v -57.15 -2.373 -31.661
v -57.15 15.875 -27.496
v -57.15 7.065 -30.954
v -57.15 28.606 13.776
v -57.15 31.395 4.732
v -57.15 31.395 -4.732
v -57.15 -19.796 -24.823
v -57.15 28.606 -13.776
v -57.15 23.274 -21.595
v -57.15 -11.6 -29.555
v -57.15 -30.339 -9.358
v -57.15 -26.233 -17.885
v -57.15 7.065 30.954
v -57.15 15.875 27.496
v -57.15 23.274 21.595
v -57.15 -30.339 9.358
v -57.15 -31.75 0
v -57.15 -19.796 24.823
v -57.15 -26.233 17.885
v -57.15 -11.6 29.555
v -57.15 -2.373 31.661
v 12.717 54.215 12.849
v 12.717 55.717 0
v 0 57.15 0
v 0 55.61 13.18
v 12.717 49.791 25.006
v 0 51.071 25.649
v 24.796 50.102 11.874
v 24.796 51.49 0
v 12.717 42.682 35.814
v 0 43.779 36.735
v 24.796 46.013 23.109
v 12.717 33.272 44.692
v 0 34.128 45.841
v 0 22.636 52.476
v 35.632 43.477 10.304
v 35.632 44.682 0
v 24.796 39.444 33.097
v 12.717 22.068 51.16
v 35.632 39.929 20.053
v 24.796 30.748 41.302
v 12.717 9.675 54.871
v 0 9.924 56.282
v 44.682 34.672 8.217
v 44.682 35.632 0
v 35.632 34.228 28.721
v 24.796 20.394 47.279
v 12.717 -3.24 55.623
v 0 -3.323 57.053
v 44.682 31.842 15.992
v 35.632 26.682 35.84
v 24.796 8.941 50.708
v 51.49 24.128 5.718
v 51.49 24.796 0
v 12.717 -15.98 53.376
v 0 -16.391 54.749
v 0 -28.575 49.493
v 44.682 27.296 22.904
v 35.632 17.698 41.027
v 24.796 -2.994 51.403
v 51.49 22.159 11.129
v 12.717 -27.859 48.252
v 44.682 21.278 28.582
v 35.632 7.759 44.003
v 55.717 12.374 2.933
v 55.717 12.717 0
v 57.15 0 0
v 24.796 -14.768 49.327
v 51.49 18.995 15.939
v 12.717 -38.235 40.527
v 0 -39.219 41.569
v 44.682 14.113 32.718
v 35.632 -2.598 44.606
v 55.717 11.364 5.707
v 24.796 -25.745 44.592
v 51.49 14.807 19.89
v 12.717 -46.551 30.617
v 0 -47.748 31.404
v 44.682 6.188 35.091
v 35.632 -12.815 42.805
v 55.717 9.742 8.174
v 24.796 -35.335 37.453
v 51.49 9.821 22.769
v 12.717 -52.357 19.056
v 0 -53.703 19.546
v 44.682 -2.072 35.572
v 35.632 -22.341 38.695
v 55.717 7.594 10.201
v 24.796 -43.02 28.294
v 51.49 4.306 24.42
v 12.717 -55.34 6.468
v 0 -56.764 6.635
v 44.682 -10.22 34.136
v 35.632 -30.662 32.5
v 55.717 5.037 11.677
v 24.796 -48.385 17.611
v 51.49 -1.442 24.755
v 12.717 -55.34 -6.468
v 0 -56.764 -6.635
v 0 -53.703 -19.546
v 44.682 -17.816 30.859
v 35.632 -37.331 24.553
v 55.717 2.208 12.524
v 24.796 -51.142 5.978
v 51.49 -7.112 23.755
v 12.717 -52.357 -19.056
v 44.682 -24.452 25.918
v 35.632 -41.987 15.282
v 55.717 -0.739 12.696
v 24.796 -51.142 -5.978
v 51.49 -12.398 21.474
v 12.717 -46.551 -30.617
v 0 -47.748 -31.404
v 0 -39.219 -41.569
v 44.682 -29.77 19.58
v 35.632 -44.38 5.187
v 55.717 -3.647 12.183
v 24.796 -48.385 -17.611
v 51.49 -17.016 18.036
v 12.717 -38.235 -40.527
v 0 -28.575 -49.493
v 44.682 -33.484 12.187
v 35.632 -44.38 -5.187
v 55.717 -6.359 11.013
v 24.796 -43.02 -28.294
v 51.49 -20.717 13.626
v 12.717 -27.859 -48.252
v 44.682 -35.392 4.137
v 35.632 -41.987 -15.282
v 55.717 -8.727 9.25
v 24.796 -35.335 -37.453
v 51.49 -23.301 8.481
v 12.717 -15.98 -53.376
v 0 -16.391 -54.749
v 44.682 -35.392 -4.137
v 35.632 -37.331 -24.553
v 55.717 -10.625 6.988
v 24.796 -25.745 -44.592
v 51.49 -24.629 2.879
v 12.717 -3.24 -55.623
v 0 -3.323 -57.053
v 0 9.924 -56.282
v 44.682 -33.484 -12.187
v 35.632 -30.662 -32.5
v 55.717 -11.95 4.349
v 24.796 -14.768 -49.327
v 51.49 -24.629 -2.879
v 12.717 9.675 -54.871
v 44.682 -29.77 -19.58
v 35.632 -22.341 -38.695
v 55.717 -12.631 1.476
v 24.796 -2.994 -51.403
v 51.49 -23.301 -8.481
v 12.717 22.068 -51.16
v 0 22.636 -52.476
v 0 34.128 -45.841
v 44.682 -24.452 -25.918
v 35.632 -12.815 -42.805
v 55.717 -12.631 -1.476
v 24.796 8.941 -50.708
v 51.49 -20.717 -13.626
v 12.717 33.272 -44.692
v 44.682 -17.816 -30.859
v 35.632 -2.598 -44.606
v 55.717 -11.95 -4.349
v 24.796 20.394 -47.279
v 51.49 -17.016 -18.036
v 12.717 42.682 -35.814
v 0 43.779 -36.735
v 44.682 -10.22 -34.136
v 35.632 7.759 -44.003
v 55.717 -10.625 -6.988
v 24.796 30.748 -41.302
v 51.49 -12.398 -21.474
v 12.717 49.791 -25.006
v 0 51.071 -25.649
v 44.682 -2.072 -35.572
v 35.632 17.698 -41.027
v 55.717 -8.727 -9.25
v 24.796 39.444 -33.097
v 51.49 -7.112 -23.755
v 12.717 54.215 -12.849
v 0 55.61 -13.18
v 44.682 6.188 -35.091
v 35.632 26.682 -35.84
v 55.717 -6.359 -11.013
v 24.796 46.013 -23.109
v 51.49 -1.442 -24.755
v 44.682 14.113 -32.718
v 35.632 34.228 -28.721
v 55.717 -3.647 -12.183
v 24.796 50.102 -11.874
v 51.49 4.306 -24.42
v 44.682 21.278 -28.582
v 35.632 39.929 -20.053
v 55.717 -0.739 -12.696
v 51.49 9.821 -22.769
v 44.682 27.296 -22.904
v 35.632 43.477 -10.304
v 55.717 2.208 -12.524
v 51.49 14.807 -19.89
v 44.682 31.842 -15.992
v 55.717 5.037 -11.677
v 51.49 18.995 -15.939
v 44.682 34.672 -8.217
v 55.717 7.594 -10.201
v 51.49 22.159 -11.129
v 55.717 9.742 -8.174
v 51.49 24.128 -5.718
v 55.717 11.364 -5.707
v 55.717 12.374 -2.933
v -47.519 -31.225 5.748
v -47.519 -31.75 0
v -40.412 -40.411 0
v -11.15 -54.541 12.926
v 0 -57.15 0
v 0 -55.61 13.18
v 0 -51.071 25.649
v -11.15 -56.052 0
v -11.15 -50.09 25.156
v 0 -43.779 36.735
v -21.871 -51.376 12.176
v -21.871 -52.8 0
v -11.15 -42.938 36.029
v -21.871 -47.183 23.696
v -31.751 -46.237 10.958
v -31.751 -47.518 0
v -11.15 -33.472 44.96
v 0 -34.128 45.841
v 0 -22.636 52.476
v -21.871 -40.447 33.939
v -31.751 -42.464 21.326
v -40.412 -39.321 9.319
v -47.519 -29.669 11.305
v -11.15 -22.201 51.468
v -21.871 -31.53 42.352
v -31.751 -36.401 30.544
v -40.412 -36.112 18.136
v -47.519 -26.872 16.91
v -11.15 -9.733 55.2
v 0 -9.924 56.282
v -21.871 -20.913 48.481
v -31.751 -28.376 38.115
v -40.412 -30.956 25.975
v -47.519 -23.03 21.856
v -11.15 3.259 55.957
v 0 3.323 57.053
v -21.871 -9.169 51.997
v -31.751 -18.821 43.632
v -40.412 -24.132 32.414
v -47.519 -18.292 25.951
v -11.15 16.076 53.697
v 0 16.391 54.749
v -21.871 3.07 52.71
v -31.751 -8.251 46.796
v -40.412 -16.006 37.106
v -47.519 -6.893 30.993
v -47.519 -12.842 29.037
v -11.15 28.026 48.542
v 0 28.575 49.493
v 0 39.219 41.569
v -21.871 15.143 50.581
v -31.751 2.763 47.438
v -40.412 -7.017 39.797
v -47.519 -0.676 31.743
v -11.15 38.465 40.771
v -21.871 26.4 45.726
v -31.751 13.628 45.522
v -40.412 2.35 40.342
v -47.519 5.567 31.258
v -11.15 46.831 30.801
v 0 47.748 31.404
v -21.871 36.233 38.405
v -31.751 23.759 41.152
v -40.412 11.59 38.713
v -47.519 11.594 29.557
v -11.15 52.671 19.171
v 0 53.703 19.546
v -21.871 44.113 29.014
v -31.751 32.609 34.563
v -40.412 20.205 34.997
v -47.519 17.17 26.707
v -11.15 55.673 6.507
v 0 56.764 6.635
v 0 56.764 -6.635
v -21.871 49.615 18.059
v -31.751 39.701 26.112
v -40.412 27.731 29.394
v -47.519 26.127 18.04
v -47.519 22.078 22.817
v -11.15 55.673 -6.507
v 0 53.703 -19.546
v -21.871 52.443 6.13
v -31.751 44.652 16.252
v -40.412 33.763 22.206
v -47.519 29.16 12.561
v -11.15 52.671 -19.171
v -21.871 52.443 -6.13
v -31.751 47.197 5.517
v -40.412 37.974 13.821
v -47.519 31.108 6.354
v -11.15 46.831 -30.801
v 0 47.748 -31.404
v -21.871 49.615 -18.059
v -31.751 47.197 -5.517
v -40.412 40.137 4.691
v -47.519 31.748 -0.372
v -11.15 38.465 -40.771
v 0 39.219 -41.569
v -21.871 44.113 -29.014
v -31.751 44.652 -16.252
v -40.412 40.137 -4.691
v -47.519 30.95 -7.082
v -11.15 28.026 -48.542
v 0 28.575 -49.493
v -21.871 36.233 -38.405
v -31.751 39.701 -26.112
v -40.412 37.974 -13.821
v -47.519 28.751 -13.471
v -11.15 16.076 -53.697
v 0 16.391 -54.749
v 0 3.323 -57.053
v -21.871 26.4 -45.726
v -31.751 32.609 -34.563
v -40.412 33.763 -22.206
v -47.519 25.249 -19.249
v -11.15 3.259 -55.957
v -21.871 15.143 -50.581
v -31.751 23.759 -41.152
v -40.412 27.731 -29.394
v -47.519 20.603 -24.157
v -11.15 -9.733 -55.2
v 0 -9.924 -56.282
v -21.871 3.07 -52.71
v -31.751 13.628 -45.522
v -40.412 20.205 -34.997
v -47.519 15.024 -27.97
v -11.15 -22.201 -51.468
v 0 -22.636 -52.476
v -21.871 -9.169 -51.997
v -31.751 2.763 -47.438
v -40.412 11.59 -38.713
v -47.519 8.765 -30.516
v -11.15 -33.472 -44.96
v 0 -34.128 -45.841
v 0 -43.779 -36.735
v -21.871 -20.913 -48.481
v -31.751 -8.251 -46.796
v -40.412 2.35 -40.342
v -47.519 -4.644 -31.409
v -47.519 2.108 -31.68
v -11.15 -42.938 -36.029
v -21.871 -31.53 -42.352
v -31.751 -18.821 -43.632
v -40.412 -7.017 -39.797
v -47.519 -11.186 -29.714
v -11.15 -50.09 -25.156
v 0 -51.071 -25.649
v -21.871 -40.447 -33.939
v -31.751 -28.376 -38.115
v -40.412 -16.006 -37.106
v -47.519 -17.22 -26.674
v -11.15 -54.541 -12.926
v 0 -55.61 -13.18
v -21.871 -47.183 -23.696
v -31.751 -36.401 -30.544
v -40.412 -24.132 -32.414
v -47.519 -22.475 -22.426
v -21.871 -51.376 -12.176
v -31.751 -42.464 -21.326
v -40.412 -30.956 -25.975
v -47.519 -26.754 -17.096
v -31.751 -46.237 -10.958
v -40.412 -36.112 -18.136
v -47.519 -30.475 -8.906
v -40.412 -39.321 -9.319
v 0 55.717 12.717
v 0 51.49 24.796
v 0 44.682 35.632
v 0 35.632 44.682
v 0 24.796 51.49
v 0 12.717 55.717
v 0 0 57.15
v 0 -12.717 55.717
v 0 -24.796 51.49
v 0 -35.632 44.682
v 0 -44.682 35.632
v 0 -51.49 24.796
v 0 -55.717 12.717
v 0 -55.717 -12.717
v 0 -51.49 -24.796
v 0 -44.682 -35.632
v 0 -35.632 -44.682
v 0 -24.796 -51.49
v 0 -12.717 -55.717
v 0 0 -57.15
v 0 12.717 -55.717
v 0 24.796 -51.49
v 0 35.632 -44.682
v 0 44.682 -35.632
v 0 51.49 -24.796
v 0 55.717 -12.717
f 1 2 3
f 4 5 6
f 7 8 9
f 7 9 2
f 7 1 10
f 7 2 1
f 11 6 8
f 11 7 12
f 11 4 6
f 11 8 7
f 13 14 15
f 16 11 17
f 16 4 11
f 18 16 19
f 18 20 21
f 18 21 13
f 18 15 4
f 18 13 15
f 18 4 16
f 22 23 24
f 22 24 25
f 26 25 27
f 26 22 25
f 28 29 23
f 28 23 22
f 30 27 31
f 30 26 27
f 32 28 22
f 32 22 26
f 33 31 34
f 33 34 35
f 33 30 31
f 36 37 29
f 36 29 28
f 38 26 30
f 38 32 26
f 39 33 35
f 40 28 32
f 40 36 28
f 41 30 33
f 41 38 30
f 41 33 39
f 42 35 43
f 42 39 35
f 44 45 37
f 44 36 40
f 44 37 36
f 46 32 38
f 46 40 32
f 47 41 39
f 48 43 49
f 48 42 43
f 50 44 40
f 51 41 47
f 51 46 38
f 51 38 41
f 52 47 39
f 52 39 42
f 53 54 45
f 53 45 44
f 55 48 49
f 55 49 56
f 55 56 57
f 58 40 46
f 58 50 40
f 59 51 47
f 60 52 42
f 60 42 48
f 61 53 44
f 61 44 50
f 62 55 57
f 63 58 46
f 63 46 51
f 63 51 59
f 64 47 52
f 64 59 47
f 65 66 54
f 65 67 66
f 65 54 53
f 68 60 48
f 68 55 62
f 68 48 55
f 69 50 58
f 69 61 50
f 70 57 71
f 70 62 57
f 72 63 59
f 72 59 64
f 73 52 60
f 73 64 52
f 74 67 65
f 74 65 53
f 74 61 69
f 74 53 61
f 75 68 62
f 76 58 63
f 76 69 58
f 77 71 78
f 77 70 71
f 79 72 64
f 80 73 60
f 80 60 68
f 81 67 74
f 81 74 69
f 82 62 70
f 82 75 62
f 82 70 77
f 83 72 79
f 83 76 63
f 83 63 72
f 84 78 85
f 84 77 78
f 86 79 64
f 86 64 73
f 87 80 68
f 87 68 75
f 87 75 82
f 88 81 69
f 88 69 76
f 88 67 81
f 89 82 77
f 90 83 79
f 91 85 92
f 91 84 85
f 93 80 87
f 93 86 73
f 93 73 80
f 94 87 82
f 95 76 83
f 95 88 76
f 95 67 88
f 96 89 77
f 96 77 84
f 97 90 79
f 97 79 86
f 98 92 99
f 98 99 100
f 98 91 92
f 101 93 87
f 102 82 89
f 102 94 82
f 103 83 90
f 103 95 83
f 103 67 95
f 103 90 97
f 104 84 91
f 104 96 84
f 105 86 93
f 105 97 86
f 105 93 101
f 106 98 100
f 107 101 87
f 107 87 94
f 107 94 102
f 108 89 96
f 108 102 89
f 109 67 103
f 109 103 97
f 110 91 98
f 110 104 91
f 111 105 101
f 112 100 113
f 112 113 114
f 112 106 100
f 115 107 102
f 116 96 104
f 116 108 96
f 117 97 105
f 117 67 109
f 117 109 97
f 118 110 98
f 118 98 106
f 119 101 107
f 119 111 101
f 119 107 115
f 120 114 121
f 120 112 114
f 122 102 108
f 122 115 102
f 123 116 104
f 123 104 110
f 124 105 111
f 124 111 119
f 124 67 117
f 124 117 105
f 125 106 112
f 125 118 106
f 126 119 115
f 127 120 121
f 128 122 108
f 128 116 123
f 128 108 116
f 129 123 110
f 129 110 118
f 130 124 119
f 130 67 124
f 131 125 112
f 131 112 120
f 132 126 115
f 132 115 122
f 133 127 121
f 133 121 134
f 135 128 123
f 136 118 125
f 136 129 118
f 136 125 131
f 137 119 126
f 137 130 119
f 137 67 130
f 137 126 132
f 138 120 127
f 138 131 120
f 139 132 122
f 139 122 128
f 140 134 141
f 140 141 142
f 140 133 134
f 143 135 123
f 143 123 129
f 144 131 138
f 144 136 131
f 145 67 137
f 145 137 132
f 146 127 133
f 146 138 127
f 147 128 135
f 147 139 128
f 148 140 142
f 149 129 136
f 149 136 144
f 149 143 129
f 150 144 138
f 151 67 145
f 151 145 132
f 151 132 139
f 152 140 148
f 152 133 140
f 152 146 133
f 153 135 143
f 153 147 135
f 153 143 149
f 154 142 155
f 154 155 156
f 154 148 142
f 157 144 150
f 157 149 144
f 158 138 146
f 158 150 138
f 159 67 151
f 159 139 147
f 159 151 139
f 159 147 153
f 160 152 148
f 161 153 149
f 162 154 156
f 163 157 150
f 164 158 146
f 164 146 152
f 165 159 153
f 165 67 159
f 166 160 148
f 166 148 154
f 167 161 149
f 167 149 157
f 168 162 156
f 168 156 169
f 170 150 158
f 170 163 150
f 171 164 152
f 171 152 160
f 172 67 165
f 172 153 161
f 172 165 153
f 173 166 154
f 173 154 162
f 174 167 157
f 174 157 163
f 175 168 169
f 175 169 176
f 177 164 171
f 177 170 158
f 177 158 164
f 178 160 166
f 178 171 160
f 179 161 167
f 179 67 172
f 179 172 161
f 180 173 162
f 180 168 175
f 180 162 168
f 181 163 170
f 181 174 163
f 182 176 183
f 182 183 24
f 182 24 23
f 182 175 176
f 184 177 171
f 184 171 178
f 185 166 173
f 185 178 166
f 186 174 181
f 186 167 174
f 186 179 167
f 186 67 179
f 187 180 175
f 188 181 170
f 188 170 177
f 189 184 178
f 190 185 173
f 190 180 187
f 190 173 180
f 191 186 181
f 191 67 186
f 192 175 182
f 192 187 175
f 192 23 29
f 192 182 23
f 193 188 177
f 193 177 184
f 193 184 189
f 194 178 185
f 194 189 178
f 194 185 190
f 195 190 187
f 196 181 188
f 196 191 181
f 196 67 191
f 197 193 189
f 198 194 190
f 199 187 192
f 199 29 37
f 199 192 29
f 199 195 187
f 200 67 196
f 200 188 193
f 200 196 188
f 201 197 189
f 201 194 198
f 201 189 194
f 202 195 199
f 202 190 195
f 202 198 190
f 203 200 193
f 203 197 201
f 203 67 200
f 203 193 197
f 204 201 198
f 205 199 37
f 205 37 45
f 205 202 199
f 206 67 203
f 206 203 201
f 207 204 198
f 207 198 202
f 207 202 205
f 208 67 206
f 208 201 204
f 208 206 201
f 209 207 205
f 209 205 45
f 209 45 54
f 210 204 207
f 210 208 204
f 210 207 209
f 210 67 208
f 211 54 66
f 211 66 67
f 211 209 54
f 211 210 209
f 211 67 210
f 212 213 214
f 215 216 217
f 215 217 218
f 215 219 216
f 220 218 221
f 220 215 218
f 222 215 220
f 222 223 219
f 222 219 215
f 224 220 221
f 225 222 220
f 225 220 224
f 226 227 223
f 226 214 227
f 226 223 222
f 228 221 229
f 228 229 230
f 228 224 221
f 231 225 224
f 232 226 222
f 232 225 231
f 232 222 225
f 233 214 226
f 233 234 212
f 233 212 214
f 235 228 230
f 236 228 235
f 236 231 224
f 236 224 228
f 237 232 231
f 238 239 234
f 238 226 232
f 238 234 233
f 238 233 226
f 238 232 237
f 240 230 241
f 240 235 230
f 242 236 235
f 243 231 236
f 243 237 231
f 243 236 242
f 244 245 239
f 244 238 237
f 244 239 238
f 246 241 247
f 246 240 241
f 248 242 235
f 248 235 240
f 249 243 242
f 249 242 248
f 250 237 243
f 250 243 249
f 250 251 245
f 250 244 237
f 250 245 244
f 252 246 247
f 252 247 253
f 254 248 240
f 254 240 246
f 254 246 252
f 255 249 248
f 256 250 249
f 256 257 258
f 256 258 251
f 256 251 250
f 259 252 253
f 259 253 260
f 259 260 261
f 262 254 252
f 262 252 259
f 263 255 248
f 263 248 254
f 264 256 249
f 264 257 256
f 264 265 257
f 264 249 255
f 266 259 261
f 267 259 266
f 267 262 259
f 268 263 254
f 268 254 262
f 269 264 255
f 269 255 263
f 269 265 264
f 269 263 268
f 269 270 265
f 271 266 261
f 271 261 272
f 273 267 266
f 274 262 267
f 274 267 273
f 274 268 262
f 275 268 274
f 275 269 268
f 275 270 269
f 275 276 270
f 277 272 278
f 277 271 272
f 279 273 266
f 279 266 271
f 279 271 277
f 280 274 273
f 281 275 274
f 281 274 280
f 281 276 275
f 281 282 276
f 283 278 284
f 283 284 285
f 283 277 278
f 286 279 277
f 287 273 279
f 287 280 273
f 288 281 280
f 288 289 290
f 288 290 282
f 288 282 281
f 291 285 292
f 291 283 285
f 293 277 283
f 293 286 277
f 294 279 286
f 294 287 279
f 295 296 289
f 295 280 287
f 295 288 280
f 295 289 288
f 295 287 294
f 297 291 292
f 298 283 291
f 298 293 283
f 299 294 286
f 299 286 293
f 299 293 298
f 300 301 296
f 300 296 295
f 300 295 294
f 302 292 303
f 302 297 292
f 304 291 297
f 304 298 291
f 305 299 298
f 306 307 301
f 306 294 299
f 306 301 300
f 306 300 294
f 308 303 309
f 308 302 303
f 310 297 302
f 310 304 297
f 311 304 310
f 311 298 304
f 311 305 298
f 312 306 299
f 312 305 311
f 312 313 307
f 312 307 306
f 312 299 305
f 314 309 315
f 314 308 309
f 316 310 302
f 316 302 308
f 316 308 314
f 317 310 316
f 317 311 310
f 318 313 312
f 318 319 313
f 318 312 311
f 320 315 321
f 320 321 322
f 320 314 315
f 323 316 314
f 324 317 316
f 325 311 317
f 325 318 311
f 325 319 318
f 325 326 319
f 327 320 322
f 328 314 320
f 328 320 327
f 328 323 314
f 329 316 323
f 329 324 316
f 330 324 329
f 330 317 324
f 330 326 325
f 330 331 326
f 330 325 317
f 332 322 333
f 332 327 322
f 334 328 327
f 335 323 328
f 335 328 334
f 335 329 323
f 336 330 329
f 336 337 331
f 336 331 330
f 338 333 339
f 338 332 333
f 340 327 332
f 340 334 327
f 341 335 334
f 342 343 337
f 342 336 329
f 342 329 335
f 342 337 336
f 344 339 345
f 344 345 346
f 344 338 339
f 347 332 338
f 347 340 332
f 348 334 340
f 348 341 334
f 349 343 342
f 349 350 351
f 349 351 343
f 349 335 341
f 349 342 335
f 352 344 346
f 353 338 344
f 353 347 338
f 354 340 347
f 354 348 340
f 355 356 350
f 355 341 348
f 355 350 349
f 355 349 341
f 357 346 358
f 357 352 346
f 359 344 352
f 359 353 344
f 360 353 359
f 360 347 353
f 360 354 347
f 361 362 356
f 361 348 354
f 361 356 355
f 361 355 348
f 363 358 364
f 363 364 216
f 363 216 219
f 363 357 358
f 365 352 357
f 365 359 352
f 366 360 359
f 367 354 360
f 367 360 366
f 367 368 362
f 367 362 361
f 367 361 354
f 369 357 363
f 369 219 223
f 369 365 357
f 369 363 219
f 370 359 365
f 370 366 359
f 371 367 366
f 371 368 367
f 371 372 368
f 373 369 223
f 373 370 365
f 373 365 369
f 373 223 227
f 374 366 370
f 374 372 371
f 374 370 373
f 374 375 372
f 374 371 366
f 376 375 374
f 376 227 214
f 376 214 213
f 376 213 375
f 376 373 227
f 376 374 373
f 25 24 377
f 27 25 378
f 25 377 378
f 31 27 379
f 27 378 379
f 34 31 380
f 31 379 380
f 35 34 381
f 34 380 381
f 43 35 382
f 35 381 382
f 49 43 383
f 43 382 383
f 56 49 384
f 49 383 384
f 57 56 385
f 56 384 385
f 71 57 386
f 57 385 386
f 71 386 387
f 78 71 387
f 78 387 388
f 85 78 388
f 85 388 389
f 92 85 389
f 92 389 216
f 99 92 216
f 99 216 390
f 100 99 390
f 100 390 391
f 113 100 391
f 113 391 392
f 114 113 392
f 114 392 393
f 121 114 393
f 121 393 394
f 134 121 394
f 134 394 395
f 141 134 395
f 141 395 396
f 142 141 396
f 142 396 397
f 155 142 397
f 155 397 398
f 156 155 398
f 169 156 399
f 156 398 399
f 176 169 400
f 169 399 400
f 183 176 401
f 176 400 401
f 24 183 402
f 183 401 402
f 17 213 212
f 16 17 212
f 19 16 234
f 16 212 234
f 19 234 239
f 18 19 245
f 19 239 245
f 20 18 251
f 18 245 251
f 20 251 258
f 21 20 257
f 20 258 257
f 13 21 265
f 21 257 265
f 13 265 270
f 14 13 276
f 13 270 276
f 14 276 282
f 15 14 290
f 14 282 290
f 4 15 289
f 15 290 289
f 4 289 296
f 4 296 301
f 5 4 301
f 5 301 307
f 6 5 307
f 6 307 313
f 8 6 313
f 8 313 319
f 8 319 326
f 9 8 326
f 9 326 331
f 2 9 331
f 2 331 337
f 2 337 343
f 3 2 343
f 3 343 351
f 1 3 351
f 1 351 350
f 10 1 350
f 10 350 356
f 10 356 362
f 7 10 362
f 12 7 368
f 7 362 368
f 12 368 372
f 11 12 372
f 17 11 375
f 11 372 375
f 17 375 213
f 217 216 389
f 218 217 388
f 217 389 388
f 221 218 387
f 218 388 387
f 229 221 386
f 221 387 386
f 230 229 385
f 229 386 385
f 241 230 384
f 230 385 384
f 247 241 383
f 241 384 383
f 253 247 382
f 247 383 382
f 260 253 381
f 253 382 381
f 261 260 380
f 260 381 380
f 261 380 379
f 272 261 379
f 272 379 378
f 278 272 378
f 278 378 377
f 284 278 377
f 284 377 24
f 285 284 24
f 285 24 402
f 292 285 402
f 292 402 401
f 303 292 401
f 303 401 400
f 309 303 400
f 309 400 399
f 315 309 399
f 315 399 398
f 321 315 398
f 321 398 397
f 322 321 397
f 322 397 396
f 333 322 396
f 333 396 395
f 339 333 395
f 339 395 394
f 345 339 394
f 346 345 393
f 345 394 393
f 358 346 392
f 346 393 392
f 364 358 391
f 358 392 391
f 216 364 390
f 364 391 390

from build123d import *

# Parameters (mm, degrees)
F0_R     = 57.15
F1_DEPTH = 57.15
F2_R     = 57.15
F3_DEPTH = 57.15
F4_R     = 57.14999
F5_R     = 57.14999
F6_R     = 31.75
F7_DEPTH = 57.15


# Not quite as in the source:
# - a fillet or chamfer is up to 0.001 mm smaller than in the source, because OpenCascade refuses the exact size


with BuildPart() as f1:
    # F0 (on Right) → F1 (new body)
    with BuildSketch(Plane.YZ):
        Circle(F0_R)
    extrude(amount=F1_DEPTH)

    # F2 (on face) → F3 (join)
    with BuildSketch(Plane(origin=(0, 0, 0), x_dir=(0, -1, 0), z_dir=(-1, 0, 0))):
        Circle(F2_R)
    extrude(amount=F3_DEPTH)

    # F4 (radius 57.15 in the source; OpenCascade refuses exactly that, so slightly less here)
    f4_edges = [f1.edges().sort_by_distance(p)[0] for p in [
        (-57.15, 57.15, 0),
    ]]
    fillet(f4_edges, radius=F4_R)

    # F5 (radius 57.15 in the source; OpenCascade refuses exactly that, so slightly less here)
    f5_edges = [f1.edges().sort_by_distance(p)[0] for p in [
        (57.15, -57.15, 0),
    ]]
    fillet(f5_edges, radius=F5_R)

    # F6 (on face) → F7 (join)
    with BuildSketch(Plane(origin=(0, 0, 0), x_dir=(0, -1, 0), z_dir=(-1, 0, 0))):
        Circle(F6_R)
    extrude(amount=F7_DEPTH)


solid = f1.part
